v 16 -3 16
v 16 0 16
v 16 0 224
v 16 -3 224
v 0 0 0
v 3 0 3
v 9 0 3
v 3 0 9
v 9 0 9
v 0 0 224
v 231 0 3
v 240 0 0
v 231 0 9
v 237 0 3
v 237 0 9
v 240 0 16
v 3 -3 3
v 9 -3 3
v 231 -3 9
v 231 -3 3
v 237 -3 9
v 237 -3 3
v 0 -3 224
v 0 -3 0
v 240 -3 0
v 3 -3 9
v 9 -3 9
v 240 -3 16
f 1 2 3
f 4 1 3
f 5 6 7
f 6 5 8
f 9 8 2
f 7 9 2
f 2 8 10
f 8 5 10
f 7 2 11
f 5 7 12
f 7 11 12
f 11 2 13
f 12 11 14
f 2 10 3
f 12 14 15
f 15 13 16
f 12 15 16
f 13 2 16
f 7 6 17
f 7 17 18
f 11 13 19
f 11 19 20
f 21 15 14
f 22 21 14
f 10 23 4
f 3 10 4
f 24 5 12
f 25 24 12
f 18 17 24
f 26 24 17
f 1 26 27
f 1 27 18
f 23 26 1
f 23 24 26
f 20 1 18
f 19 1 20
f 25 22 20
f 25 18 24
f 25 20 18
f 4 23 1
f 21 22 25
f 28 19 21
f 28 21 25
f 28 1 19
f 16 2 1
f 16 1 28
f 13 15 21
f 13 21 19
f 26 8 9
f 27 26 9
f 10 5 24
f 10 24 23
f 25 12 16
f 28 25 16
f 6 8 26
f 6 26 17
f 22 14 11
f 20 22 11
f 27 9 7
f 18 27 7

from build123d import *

# Parameters (mm, degrees)
F1_W     = 240
F1_H     = 240
F1_W_2   = 6
F1_H_2   = 6
F1_W_3   = 208
F1_H_3   = 208
F2_DEPTH = 3
F3_DEPTH = 25
F8_W     = 6
F8_H     = 6
F8_W_2   = 16
F8_H_2   = 208
F9_DEPTH = 3.001


with BuildPart() as f2:
    # F1 (on Front) → F2 (new body)
    with BuildSketch(Plane.XZ):
        with Locations((120, 120)):
            Rectangle(F1_W, F1_H)
        with Locations((6, 234)):
            Rectangle(F1_W_2, F1_H_2, mode=Mode.SUBTRACT)
        with Locations((120, 120)):
            Rectangle(F1_W_3, F1_H_3, mode=Mode.SUBTRACT)
        with Locations((6, 234)):
            Rectangle(F1_W_2, F1_H_2)
    extrude(amount=F2_DEPTH)

    # F1 (on Front) → F3 (cut)
    with BuildSketch(Plane.XZ):
        with Locations((6, 234)):
            Rectangle(F1_W_2, F1_H_2)
    extrude(amount=F3_DEPTH, mode=Mode.SUBTRACT)

    # F5: F2 across plane


with BuildPart() as f2_1:
    add(f2.part)
    add(f2.part.mirror(Plane(origin=(120, -1.5, 120), x_dir=(0, -1, 0), z_dir=(-1, 0, 0))), mode=Mode.INTERSECT)

    # F7: F2 across plane


with BuildPart() as f2_2:
    add(f2_1.part)
    add(f2_1.part.mirror(Plane(origin=(120, -1.5, 120), x_dir=(1, 0, 0), z_dir=(0, 0, 1))), mode=Mode.INTERSECT)

    # F8 (on face) → F9 (cut, through all)
    with BuildSketch(Plane.XZ.offset(3)):
        Polygon((240, 240), (0, 240), (0, 224), (16, 224), (224, 224), (240, 224), align=None)
        with Locations((6, 234)):
            Rectangle(F8_W, F8_H, mode=Mode.SUBTRACT)
        with Locations((234, 234)):
            Rectangle(F8_W, F8_H, mode=Mode.SUBTRACT)
        with Locations((232, 120)):
            Rectangle(F8_W_2, F8_H_2)
    extrude(amount=-F9_DEPTH, mode=Mode.SUBTRACT)


solid = f2_2.part
